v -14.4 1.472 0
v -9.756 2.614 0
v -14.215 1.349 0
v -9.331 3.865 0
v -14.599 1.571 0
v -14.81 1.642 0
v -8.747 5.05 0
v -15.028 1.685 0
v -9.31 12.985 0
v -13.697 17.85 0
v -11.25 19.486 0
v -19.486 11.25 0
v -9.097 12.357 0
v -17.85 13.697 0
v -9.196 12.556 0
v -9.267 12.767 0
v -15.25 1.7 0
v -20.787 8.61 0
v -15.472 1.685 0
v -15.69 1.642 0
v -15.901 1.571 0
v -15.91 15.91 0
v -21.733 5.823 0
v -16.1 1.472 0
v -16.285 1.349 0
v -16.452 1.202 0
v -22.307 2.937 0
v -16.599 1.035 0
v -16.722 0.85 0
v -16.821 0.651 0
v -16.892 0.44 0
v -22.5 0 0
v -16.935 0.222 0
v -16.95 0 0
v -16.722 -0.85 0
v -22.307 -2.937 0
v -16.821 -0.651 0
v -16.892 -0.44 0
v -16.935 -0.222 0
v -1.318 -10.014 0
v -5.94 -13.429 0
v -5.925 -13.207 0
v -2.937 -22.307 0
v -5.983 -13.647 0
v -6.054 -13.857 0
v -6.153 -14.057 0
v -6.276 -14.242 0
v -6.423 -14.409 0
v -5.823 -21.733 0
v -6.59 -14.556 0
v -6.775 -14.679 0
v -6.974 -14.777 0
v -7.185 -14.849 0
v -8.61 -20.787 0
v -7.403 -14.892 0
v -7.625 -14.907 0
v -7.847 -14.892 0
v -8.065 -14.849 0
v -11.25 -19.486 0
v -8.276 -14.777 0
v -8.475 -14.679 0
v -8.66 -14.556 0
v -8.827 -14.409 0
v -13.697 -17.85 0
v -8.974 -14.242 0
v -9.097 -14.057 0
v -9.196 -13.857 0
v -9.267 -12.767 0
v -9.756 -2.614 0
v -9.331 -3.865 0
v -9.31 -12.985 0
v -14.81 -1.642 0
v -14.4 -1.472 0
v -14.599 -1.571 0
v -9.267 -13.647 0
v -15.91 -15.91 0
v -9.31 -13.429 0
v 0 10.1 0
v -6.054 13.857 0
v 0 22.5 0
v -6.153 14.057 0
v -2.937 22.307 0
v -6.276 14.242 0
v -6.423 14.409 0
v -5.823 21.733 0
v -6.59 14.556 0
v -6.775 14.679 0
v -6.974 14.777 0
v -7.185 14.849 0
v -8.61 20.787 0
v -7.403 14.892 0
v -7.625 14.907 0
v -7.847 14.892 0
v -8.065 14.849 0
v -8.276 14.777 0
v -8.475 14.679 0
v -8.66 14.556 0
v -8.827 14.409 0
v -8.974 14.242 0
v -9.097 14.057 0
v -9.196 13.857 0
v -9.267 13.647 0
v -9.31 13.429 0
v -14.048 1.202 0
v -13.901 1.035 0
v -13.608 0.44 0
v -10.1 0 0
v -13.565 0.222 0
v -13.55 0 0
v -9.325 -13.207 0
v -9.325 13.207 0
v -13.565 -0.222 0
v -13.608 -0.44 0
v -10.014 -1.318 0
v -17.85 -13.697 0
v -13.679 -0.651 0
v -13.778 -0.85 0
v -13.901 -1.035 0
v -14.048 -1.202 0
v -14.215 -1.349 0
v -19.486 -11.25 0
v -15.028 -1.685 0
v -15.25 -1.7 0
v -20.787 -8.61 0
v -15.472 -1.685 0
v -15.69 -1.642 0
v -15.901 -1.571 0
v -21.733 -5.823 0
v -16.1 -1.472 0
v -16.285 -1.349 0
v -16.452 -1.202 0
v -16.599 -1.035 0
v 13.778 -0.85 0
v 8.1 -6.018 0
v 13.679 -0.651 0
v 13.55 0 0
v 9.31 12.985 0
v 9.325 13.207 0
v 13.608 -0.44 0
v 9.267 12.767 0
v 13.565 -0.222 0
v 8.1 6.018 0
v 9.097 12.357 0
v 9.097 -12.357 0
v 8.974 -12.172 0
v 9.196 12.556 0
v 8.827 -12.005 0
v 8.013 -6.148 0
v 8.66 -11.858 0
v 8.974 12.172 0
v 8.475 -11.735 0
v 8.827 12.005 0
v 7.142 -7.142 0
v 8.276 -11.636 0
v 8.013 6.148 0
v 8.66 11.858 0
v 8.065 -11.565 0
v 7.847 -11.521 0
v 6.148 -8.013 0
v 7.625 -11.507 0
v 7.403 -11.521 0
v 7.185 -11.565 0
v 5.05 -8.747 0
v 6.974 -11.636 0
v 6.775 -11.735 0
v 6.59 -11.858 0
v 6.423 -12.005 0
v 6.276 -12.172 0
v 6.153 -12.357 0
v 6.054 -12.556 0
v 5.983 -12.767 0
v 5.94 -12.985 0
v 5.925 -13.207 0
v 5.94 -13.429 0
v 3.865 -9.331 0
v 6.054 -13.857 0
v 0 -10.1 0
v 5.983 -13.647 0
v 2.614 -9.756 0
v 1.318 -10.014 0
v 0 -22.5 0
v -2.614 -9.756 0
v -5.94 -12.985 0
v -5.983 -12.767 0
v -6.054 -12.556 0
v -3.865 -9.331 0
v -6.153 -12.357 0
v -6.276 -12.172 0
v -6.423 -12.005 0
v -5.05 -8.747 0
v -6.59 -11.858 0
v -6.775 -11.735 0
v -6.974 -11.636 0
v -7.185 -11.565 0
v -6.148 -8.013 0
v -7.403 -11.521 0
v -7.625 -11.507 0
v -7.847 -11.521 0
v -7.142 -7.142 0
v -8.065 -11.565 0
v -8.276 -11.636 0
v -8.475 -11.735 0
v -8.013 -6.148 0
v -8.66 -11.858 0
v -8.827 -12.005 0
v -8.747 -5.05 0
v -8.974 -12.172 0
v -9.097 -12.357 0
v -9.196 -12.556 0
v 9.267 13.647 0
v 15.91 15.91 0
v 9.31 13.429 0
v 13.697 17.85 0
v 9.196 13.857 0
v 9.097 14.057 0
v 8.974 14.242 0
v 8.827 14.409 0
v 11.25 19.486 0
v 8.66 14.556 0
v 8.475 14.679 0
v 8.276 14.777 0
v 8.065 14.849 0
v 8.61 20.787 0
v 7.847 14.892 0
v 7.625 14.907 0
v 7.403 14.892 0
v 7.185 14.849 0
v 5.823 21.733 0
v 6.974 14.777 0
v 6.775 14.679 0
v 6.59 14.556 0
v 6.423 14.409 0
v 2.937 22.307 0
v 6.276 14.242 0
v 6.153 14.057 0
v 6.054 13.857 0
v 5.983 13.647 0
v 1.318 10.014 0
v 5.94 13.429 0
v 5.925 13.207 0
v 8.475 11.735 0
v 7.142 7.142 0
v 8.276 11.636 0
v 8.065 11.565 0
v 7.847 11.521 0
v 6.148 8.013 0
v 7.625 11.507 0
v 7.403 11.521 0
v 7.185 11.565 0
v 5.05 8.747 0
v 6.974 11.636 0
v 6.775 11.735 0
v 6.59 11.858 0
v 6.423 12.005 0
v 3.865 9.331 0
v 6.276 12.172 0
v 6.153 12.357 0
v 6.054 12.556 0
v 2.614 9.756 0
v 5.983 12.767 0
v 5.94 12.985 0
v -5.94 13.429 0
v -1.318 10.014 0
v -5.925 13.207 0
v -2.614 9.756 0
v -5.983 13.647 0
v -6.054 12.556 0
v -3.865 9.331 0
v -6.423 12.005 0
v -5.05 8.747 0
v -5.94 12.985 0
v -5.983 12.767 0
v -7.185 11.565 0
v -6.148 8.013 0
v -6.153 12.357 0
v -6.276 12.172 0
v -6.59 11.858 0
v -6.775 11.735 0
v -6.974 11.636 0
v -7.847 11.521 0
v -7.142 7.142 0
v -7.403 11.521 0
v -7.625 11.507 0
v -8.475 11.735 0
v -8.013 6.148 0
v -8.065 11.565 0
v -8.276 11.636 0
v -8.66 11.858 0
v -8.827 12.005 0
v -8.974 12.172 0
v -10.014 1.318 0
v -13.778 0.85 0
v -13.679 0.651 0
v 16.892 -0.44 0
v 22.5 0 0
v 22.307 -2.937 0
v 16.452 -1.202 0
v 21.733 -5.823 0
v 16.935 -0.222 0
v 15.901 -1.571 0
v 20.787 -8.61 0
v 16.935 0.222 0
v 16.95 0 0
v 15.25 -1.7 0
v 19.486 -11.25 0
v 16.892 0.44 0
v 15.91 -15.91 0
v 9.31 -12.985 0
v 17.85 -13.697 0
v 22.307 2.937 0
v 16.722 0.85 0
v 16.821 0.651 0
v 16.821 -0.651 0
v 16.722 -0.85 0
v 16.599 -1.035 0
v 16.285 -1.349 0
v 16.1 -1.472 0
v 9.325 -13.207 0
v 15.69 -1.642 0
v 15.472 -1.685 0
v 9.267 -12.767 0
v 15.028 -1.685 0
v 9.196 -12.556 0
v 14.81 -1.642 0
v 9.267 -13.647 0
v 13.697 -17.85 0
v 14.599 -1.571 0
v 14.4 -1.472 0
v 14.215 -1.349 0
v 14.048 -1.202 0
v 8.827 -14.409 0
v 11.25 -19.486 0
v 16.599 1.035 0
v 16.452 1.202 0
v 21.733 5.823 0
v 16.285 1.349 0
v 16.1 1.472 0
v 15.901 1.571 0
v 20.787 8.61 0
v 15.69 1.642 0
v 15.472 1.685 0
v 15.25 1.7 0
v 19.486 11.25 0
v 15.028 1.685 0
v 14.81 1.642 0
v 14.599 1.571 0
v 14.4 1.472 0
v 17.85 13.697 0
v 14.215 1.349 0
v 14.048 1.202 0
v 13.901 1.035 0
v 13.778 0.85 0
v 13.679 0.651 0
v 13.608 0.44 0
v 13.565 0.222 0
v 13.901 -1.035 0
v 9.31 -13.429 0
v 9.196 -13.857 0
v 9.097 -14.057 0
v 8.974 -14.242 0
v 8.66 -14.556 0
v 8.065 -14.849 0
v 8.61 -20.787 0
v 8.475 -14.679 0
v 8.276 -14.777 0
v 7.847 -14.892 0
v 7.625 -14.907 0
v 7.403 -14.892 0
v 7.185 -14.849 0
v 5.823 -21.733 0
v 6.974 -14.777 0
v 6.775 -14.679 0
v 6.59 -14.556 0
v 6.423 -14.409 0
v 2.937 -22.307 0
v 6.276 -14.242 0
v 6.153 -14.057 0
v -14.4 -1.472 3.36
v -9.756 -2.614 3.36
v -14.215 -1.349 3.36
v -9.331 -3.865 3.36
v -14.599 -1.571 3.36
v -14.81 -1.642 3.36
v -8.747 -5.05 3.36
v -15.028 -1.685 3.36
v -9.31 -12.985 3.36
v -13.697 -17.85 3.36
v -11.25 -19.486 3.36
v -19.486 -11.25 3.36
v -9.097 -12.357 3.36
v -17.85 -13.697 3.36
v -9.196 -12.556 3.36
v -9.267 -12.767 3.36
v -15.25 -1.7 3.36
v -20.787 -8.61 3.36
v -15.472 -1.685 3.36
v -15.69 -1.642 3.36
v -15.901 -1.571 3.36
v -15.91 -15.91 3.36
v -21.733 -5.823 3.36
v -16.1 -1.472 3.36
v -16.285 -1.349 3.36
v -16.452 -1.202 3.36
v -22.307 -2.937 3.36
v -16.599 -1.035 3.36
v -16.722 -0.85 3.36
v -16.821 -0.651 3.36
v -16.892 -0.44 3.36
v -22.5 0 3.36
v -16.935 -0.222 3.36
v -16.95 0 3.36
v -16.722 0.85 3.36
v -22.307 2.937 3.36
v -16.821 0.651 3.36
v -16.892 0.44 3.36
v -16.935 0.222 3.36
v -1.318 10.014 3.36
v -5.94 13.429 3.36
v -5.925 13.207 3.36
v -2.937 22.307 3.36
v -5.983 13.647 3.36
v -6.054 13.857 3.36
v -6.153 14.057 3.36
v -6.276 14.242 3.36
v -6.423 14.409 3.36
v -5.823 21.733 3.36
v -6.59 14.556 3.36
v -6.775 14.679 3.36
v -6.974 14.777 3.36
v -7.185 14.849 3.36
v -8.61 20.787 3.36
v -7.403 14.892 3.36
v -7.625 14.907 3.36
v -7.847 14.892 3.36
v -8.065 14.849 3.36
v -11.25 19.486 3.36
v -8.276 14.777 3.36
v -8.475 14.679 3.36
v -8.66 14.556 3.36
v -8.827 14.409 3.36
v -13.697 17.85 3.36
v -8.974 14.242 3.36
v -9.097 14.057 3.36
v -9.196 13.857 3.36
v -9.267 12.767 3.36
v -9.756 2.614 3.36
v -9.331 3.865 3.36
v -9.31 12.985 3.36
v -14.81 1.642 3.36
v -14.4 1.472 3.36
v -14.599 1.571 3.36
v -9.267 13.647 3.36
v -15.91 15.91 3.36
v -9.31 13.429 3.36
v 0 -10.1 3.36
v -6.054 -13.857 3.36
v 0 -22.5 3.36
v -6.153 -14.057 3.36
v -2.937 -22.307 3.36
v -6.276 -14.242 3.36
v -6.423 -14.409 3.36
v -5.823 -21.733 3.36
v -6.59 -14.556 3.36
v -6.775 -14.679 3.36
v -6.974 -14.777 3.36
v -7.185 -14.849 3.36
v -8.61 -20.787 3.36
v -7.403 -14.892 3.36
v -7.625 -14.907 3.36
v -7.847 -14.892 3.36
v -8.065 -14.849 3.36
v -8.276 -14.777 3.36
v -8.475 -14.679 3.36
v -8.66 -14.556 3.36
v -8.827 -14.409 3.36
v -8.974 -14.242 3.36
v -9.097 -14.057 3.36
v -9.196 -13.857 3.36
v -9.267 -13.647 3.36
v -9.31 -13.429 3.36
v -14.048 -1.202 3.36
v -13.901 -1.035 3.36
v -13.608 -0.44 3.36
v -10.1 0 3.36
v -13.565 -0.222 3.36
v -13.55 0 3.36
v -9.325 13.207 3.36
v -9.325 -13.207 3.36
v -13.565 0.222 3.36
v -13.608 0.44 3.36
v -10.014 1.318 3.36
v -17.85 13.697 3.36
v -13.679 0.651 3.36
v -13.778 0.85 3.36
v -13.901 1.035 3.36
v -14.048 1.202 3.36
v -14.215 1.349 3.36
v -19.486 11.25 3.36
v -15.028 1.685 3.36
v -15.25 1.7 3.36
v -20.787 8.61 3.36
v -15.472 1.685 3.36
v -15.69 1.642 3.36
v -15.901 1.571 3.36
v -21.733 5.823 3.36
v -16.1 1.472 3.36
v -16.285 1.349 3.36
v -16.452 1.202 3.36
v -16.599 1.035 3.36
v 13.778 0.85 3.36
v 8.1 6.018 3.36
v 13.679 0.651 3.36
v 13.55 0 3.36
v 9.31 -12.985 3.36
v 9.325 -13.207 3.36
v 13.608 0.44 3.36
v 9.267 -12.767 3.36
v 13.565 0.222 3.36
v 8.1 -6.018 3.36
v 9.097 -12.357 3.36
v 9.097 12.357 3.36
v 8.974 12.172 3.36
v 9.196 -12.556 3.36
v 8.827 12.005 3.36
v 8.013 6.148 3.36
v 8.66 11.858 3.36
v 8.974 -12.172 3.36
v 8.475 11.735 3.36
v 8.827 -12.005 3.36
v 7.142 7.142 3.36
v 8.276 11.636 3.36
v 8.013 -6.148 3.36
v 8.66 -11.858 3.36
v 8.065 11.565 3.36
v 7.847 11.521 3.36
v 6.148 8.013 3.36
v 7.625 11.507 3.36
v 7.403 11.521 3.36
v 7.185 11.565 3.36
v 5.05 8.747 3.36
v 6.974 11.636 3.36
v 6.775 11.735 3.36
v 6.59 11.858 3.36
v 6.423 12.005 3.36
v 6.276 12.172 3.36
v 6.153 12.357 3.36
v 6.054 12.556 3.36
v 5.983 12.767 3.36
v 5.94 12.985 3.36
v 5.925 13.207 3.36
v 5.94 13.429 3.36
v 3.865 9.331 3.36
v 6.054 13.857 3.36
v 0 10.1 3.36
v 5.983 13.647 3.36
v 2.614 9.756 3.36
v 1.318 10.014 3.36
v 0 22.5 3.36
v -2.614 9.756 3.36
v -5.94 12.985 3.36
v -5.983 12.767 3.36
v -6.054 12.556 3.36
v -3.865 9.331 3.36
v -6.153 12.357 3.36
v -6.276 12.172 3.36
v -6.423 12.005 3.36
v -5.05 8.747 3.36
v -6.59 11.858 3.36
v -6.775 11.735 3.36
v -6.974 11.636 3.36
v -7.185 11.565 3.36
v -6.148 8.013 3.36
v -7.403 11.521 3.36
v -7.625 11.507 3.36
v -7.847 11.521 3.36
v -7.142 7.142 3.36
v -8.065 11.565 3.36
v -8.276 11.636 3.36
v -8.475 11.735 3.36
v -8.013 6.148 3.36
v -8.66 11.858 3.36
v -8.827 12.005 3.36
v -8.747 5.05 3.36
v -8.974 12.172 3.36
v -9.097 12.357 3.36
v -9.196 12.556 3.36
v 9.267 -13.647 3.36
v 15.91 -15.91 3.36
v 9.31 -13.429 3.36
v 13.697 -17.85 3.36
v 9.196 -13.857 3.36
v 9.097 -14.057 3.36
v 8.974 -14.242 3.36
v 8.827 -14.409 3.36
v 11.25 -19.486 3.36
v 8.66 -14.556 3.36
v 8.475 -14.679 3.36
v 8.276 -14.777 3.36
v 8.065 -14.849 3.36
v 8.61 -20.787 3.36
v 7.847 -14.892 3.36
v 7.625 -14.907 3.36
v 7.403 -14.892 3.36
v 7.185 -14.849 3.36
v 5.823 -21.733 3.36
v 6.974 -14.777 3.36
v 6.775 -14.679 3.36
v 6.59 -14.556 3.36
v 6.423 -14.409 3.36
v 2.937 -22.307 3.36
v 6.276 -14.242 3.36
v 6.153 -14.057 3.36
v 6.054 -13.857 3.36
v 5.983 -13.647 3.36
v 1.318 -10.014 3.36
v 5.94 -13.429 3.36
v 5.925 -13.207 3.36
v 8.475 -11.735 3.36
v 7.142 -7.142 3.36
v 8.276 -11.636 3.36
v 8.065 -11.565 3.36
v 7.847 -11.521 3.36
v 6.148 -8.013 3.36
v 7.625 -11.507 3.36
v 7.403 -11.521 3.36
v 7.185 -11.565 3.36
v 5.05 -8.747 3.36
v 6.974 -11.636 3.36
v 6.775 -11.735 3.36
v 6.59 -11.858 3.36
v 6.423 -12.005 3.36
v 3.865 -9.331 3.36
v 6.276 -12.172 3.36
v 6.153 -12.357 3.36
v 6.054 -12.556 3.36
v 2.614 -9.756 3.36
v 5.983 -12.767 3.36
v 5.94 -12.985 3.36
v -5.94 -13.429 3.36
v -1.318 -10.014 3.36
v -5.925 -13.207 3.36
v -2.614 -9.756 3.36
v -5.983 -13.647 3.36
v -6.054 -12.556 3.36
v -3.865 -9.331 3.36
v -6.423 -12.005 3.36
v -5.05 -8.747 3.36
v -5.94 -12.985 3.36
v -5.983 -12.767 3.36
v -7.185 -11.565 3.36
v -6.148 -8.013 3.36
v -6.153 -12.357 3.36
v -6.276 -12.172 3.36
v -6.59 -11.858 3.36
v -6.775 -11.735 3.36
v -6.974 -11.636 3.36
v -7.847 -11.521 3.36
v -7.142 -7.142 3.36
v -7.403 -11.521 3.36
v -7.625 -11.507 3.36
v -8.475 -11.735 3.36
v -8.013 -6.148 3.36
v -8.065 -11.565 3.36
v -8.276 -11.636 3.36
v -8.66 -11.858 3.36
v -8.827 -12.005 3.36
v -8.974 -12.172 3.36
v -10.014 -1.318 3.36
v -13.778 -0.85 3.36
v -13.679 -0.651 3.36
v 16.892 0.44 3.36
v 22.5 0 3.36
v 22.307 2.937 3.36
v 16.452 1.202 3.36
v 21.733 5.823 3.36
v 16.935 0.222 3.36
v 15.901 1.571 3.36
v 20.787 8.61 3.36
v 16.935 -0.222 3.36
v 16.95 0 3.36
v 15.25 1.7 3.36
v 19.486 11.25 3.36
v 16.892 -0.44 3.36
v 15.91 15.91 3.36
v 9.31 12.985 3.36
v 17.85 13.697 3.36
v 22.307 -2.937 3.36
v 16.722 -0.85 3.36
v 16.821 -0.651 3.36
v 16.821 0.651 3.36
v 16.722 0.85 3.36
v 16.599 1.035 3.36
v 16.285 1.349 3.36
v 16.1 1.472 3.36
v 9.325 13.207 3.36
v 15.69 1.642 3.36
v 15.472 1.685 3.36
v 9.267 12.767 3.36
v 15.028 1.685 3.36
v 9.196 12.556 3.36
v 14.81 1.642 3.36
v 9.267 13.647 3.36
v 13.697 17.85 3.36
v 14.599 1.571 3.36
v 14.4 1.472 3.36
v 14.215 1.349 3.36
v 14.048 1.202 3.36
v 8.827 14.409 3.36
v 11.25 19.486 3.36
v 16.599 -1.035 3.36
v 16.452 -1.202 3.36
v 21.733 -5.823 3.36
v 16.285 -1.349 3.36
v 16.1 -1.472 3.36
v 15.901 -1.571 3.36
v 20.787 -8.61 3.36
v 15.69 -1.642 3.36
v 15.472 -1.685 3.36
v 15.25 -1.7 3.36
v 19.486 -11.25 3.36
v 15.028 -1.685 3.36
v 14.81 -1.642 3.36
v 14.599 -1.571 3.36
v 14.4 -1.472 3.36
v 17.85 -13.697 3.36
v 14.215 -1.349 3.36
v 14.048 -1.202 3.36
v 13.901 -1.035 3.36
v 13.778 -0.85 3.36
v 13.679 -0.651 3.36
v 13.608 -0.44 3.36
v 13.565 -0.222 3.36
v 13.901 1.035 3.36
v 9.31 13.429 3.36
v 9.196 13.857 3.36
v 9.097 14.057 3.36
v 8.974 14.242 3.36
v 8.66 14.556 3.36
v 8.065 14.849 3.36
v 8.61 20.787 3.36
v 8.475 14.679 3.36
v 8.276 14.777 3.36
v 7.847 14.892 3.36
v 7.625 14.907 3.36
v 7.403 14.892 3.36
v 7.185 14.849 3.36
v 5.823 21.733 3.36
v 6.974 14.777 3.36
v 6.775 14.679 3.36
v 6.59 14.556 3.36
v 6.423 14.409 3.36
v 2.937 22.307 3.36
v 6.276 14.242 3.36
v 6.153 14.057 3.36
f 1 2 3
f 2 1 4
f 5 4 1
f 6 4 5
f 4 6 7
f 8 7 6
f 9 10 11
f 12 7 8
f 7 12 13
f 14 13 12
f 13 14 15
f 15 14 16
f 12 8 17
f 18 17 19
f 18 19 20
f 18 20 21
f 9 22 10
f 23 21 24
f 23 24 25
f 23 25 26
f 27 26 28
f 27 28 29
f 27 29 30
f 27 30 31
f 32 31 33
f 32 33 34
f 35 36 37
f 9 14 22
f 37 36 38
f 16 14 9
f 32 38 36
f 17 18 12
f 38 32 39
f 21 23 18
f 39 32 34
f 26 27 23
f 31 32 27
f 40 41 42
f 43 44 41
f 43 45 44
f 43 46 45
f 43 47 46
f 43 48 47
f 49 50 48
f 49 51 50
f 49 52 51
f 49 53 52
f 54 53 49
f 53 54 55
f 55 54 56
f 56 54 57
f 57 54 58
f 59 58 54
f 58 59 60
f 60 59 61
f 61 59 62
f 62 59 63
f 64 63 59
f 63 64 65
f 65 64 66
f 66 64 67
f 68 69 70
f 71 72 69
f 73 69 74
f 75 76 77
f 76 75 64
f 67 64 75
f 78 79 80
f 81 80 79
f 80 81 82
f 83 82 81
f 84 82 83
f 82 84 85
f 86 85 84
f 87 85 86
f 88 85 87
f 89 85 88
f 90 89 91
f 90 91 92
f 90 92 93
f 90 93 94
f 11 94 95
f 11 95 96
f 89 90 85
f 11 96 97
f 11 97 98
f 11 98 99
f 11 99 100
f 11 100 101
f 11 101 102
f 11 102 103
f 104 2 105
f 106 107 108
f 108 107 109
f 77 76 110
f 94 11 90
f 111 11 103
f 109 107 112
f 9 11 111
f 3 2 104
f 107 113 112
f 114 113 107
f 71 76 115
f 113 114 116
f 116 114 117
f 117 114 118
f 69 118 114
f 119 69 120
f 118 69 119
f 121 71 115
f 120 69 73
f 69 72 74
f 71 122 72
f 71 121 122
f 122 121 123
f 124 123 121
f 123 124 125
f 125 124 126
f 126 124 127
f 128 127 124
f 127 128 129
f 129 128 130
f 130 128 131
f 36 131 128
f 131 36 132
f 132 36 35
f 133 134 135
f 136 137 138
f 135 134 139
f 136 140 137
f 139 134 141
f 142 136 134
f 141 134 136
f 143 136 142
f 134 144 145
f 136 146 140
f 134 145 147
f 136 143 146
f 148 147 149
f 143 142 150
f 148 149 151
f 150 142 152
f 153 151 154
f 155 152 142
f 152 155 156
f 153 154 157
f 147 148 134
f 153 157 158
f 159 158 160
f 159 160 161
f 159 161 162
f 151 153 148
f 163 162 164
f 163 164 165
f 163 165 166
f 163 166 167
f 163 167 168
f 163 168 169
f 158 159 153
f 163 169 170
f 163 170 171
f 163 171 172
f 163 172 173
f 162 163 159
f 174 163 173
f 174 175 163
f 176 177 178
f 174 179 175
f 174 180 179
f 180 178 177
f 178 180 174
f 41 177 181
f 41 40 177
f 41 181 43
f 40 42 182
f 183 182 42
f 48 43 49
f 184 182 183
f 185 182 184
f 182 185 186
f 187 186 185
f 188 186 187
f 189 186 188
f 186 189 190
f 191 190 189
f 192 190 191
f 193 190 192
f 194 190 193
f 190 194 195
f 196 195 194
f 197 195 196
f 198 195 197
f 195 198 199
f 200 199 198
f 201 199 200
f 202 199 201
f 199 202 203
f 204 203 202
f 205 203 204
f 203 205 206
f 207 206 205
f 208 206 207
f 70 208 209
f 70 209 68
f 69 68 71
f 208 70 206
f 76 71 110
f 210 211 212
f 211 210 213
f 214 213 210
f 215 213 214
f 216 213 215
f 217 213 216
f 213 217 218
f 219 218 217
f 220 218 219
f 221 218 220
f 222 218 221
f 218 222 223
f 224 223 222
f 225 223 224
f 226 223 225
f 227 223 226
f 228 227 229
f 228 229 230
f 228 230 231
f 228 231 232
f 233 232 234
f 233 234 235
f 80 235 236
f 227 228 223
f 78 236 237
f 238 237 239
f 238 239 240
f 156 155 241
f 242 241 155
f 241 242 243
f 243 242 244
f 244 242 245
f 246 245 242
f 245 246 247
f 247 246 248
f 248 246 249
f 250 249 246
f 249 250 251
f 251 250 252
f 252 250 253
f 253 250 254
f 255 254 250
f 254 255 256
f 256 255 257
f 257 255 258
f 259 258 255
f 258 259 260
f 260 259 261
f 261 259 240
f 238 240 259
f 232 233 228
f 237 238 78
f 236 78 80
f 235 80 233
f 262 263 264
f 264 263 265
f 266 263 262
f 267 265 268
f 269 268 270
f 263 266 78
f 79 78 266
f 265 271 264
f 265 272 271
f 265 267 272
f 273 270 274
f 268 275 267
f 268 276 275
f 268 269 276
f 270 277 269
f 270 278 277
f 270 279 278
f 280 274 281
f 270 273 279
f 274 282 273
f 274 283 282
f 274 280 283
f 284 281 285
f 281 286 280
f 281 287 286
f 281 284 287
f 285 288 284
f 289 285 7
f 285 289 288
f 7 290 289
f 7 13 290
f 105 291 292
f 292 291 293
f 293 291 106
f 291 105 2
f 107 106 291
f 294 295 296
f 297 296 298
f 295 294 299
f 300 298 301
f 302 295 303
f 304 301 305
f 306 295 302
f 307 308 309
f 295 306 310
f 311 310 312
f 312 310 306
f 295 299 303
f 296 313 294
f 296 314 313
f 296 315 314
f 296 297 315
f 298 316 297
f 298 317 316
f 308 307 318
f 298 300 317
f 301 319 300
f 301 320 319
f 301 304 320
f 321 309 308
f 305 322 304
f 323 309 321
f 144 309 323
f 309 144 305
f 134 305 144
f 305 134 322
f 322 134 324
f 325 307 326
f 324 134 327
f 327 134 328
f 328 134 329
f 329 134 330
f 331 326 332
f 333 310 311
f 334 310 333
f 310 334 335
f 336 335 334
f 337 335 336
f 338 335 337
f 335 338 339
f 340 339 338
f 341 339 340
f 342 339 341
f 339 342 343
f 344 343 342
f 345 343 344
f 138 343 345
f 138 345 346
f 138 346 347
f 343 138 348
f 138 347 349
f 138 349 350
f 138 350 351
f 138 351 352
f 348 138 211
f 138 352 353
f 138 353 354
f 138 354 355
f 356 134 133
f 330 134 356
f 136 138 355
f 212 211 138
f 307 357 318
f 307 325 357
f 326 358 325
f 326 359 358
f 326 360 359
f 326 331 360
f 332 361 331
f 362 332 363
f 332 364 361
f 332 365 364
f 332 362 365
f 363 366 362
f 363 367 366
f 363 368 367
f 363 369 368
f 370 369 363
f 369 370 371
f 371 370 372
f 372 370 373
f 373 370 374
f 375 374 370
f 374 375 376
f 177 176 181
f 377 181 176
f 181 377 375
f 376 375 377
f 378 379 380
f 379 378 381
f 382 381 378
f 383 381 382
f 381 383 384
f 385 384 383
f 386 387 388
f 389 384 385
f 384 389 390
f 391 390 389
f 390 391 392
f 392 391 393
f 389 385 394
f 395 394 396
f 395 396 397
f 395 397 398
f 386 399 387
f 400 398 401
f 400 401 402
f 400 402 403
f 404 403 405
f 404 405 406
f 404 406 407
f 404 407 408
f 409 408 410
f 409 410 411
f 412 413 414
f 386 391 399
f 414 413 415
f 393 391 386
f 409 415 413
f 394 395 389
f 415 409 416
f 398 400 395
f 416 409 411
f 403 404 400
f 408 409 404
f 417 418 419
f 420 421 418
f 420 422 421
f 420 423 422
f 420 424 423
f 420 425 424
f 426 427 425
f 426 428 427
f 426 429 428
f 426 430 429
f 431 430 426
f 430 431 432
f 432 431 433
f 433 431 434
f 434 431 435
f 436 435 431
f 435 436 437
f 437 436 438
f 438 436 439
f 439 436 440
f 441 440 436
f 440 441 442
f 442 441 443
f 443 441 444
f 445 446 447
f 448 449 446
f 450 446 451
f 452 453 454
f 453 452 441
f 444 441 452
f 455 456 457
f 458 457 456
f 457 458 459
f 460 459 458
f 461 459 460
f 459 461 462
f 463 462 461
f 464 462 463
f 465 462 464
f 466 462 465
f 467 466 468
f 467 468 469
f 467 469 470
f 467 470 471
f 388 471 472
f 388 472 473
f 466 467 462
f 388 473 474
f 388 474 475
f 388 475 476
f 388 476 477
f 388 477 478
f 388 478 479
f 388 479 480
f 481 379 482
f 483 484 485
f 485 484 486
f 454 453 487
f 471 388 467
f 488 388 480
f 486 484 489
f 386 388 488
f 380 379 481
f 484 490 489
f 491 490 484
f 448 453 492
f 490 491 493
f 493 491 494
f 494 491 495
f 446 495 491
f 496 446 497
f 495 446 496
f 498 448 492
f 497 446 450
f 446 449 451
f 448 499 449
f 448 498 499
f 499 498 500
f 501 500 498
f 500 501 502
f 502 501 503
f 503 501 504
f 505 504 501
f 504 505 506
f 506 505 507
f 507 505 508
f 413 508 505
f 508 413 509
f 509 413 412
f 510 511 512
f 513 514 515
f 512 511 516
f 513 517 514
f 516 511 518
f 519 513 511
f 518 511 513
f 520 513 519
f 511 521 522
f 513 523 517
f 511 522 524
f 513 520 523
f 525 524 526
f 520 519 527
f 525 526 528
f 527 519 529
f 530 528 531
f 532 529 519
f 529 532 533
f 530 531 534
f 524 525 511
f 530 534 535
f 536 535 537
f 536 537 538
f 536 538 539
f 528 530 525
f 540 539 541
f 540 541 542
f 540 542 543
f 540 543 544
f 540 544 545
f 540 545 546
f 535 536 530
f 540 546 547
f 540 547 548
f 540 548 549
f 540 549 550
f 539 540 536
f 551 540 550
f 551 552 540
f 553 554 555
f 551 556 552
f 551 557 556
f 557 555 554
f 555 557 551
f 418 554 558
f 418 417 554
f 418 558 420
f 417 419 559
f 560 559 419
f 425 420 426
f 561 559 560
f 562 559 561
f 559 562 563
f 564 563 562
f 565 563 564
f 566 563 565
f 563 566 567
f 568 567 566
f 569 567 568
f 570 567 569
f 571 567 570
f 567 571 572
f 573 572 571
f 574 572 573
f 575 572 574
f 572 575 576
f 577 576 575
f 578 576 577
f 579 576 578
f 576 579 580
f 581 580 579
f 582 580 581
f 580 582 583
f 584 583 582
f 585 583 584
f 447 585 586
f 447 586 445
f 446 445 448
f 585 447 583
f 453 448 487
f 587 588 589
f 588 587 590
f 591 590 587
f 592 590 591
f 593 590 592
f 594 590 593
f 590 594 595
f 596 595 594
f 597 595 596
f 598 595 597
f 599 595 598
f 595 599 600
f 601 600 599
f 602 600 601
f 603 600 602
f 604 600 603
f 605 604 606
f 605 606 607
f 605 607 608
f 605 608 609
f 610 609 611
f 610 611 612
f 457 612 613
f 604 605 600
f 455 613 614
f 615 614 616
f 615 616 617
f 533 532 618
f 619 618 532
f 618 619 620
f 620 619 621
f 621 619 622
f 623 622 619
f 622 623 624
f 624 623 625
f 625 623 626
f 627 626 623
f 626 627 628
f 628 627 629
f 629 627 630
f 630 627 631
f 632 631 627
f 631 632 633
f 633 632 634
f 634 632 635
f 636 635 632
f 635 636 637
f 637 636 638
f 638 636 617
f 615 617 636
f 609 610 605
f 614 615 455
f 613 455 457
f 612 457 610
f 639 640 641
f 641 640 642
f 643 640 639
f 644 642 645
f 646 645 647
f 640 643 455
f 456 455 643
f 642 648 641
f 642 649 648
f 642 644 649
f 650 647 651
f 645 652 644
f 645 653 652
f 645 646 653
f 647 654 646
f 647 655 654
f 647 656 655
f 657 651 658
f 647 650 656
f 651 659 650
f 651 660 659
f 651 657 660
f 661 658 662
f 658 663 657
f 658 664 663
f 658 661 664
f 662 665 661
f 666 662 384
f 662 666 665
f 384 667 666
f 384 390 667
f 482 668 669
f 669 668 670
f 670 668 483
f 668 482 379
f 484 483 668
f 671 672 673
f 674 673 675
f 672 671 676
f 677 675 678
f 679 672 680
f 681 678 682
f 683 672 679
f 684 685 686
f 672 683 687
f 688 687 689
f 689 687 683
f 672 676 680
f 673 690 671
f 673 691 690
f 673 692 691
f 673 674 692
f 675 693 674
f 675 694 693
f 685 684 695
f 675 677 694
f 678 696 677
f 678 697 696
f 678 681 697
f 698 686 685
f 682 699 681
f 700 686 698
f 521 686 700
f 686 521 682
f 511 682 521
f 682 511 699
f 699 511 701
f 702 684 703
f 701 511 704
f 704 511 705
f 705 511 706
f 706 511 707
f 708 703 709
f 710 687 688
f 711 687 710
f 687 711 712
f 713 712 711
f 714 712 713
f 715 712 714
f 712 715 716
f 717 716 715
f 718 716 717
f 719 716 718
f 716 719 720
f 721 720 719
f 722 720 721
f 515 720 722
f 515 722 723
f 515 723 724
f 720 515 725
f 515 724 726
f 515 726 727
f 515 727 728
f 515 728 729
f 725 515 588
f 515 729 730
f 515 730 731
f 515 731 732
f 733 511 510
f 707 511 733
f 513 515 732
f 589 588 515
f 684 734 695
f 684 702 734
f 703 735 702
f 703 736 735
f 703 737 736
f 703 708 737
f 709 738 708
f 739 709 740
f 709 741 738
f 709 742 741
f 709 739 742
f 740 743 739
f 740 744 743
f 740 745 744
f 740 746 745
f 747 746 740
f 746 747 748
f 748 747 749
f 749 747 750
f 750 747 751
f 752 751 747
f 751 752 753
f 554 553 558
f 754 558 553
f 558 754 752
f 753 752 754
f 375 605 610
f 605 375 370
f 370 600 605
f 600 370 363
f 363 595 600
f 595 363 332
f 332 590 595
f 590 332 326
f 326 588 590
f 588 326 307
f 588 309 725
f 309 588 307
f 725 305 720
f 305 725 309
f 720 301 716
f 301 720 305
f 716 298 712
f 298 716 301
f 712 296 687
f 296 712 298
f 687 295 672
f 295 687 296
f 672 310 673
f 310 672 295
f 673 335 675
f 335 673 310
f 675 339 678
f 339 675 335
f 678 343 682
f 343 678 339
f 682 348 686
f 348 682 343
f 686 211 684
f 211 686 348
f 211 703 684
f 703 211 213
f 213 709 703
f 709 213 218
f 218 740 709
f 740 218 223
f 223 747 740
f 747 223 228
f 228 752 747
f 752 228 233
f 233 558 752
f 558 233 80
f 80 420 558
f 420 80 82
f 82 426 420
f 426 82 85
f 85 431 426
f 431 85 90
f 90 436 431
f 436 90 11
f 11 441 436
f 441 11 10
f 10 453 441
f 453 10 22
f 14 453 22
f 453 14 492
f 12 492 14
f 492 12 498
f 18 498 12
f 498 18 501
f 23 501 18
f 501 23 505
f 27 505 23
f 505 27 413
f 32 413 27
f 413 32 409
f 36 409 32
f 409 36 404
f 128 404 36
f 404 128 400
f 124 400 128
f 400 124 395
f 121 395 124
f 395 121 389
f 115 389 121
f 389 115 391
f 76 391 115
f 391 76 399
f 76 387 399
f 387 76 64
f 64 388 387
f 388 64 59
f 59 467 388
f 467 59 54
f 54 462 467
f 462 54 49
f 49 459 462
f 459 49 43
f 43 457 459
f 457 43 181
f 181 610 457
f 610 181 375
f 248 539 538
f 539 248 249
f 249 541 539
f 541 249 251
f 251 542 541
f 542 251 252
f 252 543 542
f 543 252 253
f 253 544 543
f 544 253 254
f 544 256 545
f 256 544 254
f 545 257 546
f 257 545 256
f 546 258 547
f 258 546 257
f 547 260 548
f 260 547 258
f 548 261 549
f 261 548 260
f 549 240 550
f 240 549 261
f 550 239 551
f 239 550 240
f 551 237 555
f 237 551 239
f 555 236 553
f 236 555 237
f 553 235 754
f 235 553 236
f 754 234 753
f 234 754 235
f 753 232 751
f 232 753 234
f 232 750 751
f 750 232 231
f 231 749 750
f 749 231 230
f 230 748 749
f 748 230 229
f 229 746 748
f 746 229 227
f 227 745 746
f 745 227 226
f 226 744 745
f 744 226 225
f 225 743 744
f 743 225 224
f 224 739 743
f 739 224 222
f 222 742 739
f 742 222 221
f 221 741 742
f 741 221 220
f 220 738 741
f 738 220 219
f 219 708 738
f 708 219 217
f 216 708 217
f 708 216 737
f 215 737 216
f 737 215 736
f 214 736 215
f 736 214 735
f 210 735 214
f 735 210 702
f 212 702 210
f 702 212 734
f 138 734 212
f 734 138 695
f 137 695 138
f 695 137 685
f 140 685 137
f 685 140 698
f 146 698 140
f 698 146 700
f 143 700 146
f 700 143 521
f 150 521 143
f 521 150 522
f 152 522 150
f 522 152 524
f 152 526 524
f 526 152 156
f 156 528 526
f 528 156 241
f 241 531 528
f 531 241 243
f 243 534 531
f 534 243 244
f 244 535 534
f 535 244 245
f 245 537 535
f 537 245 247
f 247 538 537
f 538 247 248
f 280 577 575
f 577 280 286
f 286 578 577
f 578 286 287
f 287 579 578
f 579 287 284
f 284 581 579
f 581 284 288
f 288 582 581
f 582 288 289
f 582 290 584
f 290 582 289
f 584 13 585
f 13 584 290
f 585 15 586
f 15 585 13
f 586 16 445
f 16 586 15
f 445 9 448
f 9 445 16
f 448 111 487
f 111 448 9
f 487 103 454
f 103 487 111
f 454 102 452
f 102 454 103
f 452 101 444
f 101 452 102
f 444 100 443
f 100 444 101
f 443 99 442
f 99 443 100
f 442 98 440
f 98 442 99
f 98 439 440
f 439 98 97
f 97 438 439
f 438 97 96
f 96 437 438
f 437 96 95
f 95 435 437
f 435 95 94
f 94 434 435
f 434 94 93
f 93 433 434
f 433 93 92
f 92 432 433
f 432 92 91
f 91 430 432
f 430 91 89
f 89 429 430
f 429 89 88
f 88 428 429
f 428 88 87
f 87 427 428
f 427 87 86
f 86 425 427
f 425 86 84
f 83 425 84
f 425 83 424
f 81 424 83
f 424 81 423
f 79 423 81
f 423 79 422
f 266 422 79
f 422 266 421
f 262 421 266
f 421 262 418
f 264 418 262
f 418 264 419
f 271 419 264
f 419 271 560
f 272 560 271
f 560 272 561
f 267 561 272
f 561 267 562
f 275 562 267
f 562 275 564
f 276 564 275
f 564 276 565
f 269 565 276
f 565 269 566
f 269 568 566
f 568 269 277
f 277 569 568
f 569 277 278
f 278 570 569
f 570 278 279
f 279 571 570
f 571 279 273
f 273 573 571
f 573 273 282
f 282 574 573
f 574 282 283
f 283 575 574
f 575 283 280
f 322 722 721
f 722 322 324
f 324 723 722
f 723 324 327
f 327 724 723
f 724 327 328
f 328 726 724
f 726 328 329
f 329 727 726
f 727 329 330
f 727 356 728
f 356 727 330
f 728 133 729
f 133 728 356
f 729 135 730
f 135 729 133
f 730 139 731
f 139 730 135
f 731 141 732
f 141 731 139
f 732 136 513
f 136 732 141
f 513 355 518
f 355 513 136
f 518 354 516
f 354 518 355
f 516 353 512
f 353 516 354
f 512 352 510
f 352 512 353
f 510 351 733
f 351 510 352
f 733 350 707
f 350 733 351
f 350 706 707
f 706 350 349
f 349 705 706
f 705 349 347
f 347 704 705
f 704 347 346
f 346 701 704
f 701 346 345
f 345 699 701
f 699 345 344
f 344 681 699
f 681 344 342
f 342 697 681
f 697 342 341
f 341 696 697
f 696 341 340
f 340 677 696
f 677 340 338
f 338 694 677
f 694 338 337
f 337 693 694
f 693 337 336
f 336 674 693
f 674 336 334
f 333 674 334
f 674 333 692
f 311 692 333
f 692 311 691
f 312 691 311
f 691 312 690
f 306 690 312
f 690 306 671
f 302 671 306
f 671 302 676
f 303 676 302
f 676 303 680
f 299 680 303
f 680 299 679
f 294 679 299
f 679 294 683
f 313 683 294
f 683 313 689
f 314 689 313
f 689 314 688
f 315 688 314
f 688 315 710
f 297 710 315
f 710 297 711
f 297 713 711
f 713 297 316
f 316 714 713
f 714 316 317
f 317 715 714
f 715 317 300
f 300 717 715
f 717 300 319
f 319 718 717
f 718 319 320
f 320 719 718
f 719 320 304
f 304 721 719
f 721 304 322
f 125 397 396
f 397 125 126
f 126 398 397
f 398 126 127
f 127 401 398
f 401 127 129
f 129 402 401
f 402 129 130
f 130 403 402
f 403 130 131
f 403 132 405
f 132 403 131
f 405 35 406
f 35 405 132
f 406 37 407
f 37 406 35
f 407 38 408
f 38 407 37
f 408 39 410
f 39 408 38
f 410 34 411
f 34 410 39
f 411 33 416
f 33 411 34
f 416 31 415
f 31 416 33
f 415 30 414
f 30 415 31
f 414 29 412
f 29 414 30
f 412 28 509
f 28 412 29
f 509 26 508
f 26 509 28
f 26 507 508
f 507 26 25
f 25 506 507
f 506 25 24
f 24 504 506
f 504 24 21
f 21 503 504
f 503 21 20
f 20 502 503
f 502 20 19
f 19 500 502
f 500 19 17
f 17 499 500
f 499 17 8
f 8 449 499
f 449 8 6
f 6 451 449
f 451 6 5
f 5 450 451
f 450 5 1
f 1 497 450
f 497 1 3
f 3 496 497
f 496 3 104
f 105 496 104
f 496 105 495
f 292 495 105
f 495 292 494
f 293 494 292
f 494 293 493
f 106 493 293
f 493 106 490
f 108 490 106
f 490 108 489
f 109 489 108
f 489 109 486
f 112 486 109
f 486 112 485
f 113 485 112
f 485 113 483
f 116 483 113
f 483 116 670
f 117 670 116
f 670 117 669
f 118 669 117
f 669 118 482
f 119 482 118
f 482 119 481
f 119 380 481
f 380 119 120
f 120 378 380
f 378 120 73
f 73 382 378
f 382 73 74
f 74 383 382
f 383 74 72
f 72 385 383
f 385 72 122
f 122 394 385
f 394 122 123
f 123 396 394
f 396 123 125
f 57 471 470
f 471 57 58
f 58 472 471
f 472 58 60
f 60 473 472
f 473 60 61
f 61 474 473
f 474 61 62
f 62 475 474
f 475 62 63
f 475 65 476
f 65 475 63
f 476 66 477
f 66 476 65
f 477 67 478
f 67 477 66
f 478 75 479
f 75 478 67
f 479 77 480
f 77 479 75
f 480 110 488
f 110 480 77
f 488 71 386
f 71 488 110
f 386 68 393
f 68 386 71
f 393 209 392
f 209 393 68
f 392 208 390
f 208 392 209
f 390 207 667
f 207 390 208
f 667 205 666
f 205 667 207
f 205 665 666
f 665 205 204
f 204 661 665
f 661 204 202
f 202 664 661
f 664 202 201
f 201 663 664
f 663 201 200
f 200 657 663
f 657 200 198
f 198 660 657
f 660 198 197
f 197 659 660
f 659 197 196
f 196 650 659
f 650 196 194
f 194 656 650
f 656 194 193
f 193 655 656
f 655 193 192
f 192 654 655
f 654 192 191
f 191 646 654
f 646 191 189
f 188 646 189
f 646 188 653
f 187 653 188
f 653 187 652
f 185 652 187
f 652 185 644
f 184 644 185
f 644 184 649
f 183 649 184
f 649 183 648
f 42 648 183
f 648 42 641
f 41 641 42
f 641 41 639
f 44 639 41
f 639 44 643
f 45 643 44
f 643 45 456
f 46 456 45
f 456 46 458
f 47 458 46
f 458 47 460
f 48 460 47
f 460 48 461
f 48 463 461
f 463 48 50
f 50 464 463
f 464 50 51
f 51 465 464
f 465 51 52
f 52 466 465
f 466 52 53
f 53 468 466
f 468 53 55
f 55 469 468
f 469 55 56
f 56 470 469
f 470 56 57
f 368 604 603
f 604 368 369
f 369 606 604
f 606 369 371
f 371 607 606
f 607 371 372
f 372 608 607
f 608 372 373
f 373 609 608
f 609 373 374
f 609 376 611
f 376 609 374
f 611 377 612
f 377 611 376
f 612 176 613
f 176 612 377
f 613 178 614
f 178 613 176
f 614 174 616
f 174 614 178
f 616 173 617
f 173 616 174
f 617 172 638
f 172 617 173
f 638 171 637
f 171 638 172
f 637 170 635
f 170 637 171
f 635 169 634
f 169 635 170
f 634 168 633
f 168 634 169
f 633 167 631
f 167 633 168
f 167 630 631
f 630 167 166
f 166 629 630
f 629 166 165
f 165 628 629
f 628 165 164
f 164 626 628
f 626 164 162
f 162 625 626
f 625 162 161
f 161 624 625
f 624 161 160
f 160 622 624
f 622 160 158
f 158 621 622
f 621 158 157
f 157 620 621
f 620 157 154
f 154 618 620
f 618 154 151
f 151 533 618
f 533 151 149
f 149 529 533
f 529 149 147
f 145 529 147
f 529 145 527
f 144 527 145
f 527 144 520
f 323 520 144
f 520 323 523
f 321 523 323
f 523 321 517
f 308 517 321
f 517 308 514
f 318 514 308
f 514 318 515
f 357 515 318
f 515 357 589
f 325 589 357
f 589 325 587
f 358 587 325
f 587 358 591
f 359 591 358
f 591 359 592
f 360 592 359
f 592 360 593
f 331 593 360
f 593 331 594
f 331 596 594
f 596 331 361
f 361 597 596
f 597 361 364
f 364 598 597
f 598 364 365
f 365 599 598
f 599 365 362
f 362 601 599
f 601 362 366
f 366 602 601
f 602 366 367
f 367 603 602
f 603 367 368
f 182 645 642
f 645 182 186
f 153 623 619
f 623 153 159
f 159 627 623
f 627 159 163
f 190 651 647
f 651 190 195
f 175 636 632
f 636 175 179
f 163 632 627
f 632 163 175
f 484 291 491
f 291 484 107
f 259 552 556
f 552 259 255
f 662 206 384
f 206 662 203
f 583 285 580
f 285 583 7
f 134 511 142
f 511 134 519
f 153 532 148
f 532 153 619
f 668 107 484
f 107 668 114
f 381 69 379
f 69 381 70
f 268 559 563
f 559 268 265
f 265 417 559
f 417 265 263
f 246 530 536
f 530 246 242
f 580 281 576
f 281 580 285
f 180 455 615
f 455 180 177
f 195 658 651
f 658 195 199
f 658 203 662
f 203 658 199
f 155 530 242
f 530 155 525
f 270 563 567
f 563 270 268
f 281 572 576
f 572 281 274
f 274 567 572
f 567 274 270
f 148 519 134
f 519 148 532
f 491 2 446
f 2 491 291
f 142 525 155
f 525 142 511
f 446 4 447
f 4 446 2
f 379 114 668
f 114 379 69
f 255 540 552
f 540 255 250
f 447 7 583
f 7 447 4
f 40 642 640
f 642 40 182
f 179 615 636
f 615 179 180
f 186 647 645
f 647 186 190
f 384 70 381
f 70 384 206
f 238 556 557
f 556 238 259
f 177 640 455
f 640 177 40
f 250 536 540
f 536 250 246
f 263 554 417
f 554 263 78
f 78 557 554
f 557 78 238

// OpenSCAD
// file: joint_hub.scad
/*
 * joint_hub.scad - STANDARD_JOINT_HUB 제작 부품(printed part)
 *
 * SCARA_KINEMATICS.md의 표준 조인트 체결을 따른다. J2(어깨)·J3(팔꿈치)·
 * J4(손목) 회전 관절이 공유하는 표준 조인트 허브 — 회전축을 중심으로 인접
 * 링크를 정렬하고, M3 heat-set 인서트(insert) 체결로 토크를 전달한다.
 *
 * 특징(feature): 원형 플랜지(circular flange), 직선 키 파일럿 보스(keyed pilot
 * boss), 대칭 M3 인서트 패턴, 축 보어(axis bore). 외곽은 360° 회전 여유를 위해
 * 원형으로 유지한다. 베어링 내륜 이격(standoff)은 별도 스페이서(spacer)가
 * 담당한다.
 *
 * 인터페이스는 단일 출처(single source of truth)다. 마운트가 직접 읽는 값만
 * 접근자 함수(joint_pilot_d·joint_pilot_h)로 노출하고, 모듈 내부에서만 쓰는
 * 치수는 변수로 둔다(use가 모듈을 정의 스코프에서 해석하므로 cross-file 안전).
 * parts/joint_mount.scad는 joint_hub를 use해 함수·공유 모듈(joint_disk·
 * keyed_pilot)을 읽고, 치수를 중복 정의하지 않는다.
 *
 * 좌표계: 회전축(axis) = Z, 플랜지 = z=0..flange_t, 파일럿 보스는 +z(마운트 쪽).
 */

include <../config.scad>

/* --- 인터페이스 접근자(accessor) — joint_mount.scad가 use로 직접 호출 --- */
function joint_pilot_d() = 20;			/* keyed pilot boss 외경 — 방향·중심 기준 */
function joint_pilot_h() = seat_shoulder_t;	/* pilot boss 돌출 높이 */

/* --- 형상 치수 — joint_hub 모듈 내부에서만 쓰여 변수로 둔다. use는 모듈을
 * 그 정의 스코프에서 해석하므로 cross-file(마운트)에서도 안전하다. --- */
joint_axis_bore_d = 8 + print_clearance;	/* M6 숄더 볼트 관통 보어 */
joint_pilot_key_t = 2;				/* 방향 키(key) 평면 절삭량 */
joint_bolt_n      = 6;				/* 둘레 체결 볼트 홀 개수(대칭 패턴) */
joint_bolt_head_d = 6.5;			/* 둘레 M3 캡 스크류 머리 + 여유 — 디스크 사이징 */
joint_head_d      = 13;				/* 중앙 M6 숄더 볼트 머리 — assert용 */

/*
 * 디스크 외경(disk diameter) — 중앙 파일럿(pilot_d)에 둘레 여백 하나를 두고,
 * 그 바깥으로 둘레 볼트 머리와 외곽 여백을 지름 양쪽으로((bolt_head + margin)
 * × 2) 더한다. 파일럿·볼트·외곽이 서로 layout_margin으로 이격된다.
 */
joint_disk_d = joint_pilot_d() + layout_margin
	+ (joint_bolt_head_d + layout_margin) * 2;

/* 검증 — 중앙 M6 머리가 파일럿 소켓(마운트 전 두께 관통)을 통과해야 한다. */
assert(joint_pilot_d() >= joint_head_d,
       "joint_pilot_d must be >= joint_head_d (M6 head must clear pilot socket)");

/* 체결 볼트 분포원(bolt circle) — 디스크 가장자리에서 볼트 머리 + margin 안쪽. */
joint_bolt_pitch_circle_d = joint_disk_d - joint_bolt_head_d - 2 * layout_margin;

/* --- 허브 전용 치수 --- */
insert_hole_d	= 4.2;	/* M3 heat-set brass insert 블라인드 홀 지름 */
insert_hole_h	= 5;	/* 인서트 홀 깊이 */
flange_d	= joint_disk_d;	/* 원형 플랜지 외경 — 머리 레이아웃 파생 */
flange_t	= insert_hole_h + seat_shoulder_t;	/* 인서트 블라인드 홀 + FDM 최소 바닥 */

/*
 * 방향 키(key)가 붙은 파일럿 형상 — 외경 d, 높이 h로 바로 압출한다. 한쪽
 * 평면 절삭으로 각도를 강제하며, 허브 보스(양형)·마운트 소켓(음형)이 공유해
 * 항상 일치한다.
 */
module keyed_pilot(d, h)
	linear_extrude(h)
		difference() {
			circle(d = d);
			translate([d / 2 - joint_pilot_key_t, -d])
				square([d, 2 * d]);
		}

/*
 * 허브·마운트 공유 디스크 — 디스크 외경 + 중앙 축 보어 + 볼트 피치원 홀
 * (bolt_hole_d)을 갖는 높이 h 솔리드. 두 부품이 같은 외경·축 보어·볼트원을
 * 쓴다.
 */
module joint_disk(bolt_hole_d, h)
	linear_extrude(h)
		difference() {
			circle(d = joint_disk_d);
			circle(d = joint_axis_bore_d);
			for (i = [0 : joint_bolt_n - 1])
				rotate([0, 0, i * 360 / joint_bolt_n])
					translate([joint_bolt_pitch_circle_d / 2, 0])
						circle(d = bolt_hole_d);
		}

module joint_hub()
{
	pilot_h	= joint_pilot_h();

	difference() {
		union() {
			/* keyed pilot boss — 마운트 소켓에 끼워 동심·방향 강제 */
			translate([0, 0, flange_t - eps])
				keyed_pilot(joint_pilot_d(), pilot_h + eps);

			/* 플랜지 — 공유 디스크(축 보어 + 인서트 홀 관통) */
			joint_disk(insert_hole_d, flange_t);

			/* blind 플러그 — 같은 디스크를 볼트 홀 없이(bolt_hole_d = 0)
			 * 두께에서 인서트 깊이를 뺀 만큼 깔아 인서트 홀 바닥을 메운다
			 * → 인서트 홀이 blind가 된다(축 보어는 디스크가 관통 유지). */
			joint_disk(0, flange_t - insert_hole_h);
		}

		/* 축 보어 — 플랜지·파일럿 전체 관통(M6 숄더 볼트) */
		translate([0, 0, -eps])
			cylinder(d = joint_axis_bore_d,
				 h = flange_t + pilot_h + 2 * eps);
	}
}

joint_hub();
// file: ../config.scad
// SCARA 로봇 공통 사양(specification) — 모든 부품 파일에서 include해 사용한다.

$fn = 48;

// ── 공차(tolerance) ──
print_clearance = 0.2;   // FDM 출력 끼워맞춤(fit) 여유 — 압입(press-fit) 자리 제외
eps             = 1/128; // 미세 겹침(epsilon) — 접하는 솔리드를 살짝 겹쳐 동일면(coincident face) z-파이팅 방지

// ── FDM 출력 사양(print specification) ──
fdm_layer_h       = 0.28;   // 레이어 높이(layer height) — 슬라이서(slicer) 설정값과 일치시킨다.
fdm_shoulder_layers = 6;   // 숄더(shoulder) 최소 레이어 수 — FDM 최소 구조 벽(0.4mm 노즐 3겹 ~1.2mm) 기준 하한값.

// ── 레이아웃(layout) ──
// layout_margin — 플레이트 위 부품 배치 공통 여백(margin). 부품 외곽선에서
// 사방으로 주는 값 → 부품끼리는 2*margin 이격, 외곽 가장자리도 margin 확보.
layout_margin = 4;

// ── 시트 형상(seat geometry) ──
// seat_shoulder_t — fdm_layer_h · fdm_shoulder_layers 파생. 슬라이서 설정 변경 시 자동 연동.
seat_shoulder_t = fdm_layer_h * fdm_shoulder_layers;
// main file
/*
 * joint_mount.scad - STANDARD_JOINT_MOUNT 제작 부품(printed part)
 *
 * SCARA_KINEMATICS.md의 표준 조인트 체결을 따른다. UPPER_ARM_LINK·
 * FOREARM_LINK·TOOL_LINK 모듈 쪽에서 STANDARD_JOINT_HUB를 받아 정렬하고
 * 체결하는 수용부(receiving feature). 링크 플레이트에 통합되는 인터페이스
 * 디스크(disk)로, 실제 부품에서는 이 형상을 플레이트에 합쳐 쓴다.
 *
 * 특징(feature): 키 파일럿 소켓(keyed pilot socket, 전 두께 관통 — 파일럿
 * 수용 겸 중앙 M6 머리·락너트 회피), M3 캡스크류 클리어런스 홀(clearance hole).
 *
 * 인터페이스 치수는 joint_hub.scad를 use하여 함수(joint_pilot_d 등)와 공유
 * 모듈(joint_disk·keyed_pilot)로 읽는다 — 허브가 단일 출처(single source)이며
 * 마운트는 치수를 중복 정의하지 않아 두 부품이 항상 정합한다.
 *
 * 좌표계: 회전축(axis) = Z. 허브 대면(소켓) = z=0, 바깥면 = z=mount_t.
 */

include <../config.scad>
use <joint_hub.scad>

/* --- 마운트 전용 치수 --- */
screw_clear_d	= 3.4;	/* M3 캡스크류 관통 홀 */

/* 판 두께 — 파일럿 수용 + FDM 최소 바닥(전 두께 소켓 위 머리 회피 여유) */
mount_t		= joint_pilot_h() + seat_shoulder_t;

module joint_mount()
{
	/* 키 소켓 — FDM 여유 헐겁게(joint_hub 함수에서 읽음) */
	socket_d = joint_pilot_d() + print_clearance;

	difference() {
		/* 본체 — 공유 디스크(둘레 클리어런스 홀) 한 장 */
		joint_disk(screw_clear_d, mount_t);

		/* keyed pilot 소켓 — 전 두께 관통으로 파서 파일럿 수용 +
		 * 중앙 머리·락너트 회피를 겸한다(비원형이라 difference). */
		translate([0, 0, -eps])
			keyed_pilot(socket_d, mount_t + 2 * eps);
	}
}

joint_mount();
